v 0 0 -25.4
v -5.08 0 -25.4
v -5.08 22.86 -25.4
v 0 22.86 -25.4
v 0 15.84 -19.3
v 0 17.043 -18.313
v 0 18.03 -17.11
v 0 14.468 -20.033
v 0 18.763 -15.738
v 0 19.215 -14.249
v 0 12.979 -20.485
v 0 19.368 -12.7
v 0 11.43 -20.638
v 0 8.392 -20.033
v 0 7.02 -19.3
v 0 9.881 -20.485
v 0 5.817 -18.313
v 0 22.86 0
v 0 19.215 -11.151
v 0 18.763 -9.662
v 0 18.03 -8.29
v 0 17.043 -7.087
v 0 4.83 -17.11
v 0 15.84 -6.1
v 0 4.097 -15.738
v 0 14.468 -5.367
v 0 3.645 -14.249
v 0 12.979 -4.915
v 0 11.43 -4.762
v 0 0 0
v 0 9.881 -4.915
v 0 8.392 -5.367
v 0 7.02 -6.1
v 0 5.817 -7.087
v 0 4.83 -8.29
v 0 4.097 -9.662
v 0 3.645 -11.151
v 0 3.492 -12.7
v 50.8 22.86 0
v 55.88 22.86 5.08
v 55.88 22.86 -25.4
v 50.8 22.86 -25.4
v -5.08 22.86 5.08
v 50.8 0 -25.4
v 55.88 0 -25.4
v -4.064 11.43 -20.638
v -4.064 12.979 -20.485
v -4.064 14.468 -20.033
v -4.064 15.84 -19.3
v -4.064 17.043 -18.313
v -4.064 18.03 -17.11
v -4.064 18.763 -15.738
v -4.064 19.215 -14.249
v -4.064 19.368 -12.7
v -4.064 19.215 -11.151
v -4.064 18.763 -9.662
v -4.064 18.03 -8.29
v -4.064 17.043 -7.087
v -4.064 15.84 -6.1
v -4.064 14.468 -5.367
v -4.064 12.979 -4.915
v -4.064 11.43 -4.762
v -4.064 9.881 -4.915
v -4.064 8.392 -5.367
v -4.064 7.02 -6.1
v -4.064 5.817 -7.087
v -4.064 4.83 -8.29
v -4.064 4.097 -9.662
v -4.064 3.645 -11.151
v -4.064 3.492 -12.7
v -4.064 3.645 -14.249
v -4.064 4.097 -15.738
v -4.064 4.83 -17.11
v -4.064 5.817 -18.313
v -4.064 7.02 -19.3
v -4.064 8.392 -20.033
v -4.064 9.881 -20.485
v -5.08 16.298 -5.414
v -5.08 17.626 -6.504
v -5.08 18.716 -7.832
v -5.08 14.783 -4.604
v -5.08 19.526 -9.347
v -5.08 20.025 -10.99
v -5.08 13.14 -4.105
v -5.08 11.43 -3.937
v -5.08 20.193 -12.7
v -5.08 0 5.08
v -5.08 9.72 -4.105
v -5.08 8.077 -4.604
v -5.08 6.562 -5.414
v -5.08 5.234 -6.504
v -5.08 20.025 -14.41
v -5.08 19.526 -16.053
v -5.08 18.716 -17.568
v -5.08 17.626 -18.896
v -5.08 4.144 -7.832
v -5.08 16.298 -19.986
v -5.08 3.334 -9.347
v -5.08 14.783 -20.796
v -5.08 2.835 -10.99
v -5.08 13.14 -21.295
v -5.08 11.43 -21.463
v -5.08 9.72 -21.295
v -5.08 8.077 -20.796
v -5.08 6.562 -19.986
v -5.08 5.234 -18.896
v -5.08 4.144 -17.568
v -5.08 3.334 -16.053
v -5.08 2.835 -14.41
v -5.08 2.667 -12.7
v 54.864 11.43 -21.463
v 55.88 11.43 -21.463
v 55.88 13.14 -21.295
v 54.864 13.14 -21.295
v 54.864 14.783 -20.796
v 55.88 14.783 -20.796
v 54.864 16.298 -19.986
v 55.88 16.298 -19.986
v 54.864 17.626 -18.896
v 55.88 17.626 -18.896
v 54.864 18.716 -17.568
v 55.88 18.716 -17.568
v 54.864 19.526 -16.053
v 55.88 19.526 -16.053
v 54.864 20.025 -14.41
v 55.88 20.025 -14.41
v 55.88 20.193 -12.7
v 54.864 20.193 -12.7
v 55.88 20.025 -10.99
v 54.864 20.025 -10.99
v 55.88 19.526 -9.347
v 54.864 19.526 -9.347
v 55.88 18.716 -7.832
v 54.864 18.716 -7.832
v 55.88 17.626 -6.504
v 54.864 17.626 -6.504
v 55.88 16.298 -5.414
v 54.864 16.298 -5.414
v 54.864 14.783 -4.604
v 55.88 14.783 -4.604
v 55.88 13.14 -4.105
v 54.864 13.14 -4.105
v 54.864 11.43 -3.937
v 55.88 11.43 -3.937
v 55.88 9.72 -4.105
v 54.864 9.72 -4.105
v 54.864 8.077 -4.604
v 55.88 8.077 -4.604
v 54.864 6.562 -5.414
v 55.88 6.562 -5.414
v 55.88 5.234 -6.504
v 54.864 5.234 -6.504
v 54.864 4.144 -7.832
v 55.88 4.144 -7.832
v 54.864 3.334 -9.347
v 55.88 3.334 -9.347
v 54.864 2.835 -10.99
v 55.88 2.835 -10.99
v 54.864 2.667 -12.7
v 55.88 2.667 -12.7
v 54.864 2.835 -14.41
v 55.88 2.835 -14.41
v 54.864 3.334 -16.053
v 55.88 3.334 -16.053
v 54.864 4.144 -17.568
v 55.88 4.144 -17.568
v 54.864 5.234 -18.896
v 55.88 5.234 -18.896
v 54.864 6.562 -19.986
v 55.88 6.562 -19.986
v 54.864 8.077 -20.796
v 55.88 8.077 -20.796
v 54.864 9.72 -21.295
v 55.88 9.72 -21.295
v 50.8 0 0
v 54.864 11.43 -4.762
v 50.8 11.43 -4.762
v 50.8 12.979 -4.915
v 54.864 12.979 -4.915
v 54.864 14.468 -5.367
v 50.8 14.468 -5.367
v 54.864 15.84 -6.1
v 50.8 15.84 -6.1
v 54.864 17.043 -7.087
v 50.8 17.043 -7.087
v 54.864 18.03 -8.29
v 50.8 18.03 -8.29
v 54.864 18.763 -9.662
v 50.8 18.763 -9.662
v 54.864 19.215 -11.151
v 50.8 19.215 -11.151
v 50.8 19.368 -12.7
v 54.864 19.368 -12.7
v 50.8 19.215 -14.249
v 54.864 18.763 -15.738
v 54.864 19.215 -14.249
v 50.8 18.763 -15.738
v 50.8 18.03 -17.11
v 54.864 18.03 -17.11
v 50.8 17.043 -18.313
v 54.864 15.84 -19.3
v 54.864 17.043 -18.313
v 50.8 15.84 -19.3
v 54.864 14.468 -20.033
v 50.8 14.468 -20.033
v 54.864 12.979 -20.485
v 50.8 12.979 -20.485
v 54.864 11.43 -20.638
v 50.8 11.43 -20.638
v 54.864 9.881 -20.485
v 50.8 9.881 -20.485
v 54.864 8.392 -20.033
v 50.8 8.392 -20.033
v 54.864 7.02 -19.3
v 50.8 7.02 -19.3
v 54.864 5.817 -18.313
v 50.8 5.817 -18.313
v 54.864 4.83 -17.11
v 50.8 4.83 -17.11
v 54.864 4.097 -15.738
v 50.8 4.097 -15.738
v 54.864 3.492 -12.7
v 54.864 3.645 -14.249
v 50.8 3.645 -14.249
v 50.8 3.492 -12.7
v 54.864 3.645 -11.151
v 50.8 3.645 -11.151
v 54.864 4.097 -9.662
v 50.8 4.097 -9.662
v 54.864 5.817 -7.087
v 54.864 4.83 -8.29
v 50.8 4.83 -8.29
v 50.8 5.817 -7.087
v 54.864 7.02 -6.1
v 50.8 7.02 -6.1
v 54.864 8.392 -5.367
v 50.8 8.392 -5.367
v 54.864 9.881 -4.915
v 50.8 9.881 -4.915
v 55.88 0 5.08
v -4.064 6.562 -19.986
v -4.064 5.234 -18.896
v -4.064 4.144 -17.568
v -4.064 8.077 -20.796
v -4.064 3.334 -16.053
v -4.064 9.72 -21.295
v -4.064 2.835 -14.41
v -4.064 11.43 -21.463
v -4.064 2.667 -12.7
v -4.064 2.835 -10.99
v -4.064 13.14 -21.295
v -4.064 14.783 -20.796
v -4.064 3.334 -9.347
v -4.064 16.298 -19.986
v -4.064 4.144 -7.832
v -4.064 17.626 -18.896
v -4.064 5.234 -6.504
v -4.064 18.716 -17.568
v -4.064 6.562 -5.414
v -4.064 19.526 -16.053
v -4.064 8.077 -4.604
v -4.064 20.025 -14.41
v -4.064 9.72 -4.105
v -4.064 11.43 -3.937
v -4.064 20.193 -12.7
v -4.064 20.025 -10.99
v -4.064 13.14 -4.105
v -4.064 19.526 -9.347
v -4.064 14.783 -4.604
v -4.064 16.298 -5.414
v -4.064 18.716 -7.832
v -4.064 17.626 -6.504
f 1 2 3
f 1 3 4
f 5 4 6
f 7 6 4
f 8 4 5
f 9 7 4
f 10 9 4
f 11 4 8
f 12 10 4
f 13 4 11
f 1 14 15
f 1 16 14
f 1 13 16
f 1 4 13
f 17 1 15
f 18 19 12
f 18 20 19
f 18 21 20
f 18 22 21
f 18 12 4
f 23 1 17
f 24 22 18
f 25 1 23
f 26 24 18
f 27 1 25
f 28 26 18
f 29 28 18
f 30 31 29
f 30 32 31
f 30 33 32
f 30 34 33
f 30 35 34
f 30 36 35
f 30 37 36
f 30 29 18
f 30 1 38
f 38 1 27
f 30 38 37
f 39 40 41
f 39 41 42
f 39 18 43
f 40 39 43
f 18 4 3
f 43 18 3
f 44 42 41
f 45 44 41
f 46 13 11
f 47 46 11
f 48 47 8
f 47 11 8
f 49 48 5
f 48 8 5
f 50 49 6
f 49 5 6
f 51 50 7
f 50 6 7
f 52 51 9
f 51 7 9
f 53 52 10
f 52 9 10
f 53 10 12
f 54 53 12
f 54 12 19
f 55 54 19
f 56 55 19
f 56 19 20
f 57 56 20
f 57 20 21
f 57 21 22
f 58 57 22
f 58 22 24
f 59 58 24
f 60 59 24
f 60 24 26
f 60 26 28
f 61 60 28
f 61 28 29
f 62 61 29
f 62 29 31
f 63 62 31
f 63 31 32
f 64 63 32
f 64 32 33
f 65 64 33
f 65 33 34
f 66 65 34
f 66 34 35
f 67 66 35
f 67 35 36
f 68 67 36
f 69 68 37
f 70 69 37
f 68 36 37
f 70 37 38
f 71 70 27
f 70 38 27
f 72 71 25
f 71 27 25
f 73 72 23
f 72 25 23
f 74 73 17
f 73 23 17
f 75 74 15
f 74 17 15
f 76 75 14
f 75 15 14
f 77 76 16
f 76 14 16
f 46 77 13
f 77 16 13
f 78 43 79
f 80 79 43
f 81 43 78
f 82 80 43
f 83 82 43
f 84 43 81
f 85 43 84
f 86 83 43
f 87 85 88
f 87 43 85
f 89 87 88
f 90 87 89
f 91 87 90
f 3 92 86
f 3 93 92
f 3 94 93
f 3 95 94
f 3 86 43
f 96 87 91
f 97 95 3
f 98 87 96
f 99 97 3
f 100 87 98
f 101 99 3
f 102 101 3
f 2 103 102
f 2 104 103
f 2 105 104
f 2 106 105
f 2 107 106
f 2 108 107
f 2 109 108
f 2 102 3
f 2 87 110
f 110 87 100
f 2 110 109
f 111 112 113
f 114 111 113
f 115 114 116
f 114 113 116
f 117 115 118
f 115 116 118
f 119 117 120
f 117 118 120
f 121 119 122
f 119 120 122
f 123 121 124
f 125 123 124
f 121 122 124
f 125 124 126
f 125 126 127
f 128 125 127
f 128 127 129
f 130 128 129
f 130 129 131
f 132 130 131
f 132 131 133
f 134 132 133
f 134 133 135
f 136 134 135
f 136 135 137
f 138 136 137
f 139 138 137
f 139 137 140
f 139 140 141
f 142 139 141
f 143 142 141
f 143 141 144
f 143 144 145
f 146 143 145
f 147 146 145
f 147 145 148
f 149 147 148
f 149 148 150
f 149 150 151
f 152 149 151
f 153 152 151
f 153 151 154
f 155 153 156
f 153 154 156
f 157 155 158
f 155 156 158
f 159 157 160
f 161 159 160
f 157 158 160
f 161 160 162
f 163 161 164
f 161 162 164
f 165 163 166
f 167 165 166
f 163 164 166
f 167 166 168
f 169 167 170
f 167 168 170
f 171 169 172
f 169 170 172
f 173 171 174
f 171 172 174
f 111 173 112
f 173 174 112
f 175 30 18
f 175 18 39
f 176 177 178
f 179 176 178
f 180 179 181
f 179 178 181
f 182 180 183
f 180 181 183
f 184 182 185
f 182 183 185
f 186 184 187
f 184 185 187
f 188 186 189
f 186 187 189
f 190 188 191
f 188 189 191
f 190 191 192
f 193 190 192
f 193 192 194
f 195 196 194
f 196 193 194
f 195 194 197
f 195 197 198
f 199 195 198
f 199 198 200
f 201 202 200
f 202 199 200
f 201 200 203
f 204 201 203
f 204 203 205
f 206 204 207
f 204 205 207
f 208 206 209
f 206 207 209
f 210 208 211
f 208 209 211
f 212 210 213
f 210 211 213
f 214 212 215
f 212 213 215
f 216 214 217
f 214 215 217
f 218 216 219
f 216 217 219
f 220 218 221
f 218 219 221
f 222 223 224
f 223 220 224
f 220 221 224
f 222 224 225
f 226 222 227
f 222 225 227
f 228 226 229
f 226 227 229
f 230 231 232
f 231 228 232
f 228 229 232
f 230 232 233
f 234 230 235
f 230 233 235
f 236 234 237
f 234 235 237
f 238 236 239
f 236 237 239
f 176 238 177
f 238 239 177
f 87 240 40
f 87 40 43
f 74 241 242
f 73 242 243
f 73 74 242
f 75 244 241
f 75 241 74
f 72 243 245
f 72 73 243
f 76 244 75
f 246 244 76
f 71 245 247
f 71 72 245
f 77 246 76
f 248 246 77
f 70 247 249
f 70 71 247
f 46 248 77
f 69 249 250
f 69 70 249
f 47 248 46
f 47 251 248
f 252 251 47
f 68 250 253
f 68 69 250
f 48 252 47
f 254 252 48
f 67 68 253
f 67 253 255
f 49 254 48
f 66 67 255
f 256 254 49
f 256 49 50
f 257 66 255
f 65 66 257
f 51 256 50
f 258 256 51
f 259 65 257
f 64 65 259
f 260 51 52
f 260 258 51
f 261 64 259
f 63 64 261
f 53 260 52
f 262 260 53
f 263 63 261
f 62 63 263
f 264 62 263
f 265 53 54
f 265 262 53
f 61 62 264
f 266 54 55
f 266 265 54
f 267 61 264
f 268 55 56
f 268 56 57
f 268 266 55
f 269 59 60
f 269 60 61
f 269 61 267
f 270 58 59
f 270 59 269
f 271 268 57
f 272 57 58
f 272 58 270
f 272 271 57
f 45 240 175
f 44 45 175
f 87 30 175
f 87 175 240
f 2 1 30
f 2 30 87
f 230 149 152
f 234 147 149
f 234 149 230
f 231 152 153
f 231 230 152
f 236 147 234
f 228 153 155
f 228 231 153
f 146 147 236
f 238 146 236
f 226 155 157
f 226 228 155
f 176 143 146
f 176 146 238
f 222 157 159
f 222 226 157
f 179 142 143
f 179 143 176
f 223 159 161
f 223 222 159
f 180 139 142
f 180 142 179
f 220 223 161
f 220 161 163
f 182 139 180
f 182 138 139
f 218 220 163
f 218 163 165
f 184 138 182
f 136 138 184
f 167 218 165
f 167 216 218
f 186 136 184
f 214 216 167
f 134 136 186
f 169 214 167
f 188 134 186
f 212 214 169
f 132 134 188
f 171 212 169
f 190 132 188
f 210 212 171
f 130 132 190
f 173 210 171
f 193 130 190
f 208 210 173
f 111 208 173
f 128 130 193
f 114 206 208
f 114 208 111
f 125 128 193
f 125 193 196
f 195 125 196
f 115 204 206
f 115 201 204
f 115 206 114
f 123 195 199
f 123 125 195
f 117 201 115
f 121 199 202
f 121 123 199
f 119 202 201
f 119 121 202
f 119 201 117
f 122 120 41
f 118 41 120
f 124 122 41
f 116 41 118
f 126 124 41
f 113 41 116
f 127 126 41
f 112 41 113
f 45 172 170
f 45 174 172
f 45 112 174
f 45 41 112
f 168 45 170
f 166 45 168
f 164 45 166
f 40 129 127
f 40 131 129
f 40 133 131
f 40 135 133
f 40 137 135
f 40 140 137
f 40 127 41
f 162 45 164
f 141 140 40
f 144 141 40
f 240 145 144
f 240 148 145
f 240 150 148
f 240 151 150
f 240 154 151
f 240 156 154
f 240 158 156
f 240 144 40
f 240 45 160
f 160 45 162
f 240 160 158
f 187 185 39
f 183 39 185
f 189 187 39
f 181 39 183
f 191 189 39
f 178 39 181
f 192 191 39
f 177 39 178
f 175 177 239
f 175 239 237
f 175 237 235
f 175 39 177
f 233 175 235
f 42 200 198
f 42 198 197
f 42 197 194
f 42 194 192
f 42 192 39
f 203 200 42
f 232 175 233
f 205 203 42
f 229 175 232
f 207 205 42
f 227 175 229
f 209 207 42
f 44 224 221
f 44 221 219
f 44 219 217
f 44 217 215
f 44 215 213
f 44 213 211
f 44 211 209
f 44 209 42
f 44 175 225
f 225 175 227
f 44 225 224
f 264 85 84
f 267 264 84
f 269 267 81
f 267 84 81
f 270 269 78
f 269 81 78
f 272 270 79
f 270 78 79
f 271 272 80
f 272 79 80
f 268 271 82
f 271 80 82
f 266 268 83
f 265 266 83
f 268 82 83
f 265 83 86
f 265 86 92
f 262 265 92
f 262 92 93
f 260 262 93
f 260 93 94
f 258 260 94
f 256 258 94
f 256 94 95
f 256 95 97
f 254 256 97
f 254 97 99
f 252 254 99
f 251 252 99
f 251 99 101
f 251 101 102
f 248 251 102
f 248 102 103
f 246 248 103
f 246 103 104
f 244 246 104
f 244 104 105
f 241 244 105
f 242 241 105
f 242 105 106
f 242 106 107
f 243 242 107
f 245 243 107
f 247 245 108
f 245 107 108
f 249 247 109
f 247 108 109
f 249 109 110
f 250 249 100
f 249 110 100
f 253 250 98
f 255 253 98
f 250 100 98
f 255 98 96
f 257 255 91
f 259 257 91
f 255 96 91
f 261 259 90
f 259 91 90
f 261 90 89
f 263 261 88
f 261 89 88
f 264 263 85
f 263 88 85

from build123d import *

# Parameters (mm, degrees)
EXTRUDE_THIN1_DEPTH                            = 22.86
CBORE_FOR_6_SOCKET_HEAD_CAP_SCREW1_D           = 15.875
CBORE_FOR_6_SOCKET_HEAD_CAP_SCREW1_DEPTH       = 5.08
CBORE_FOR_6_SOCKET_HEAD_CAP_SCREW1_CBORE_D     = 17.526
CBORE_FOR_6_SOCKET_HEAD_CAP_SCREW1_CBORE_DEPTH = 1.016
CBORE_FOR_6_SOCKET_HEAD_CAP_SCREW2_D           = 15.875
CBORE_FOR_6_SOCKET_HEAD_CAP_SCREW2_CBORE_D     = 17.526
CBORE_FOR_6_SOCKET_HEAD_CAP_SCREW2_CBORE_DEPTH = 1.016


with BuildPart() as part:
    # Sketch1 → Extrude-Thin1 (new body)
    with BuildSketch(Plane(origin=(0, 0, 0), x_dir=(1, 0, 0), z_dir=(0, 1, 0))):
        Polygon((0, 25.4), (0, 0), (50.8, 0), (50.8, 25.4), (55.88, 25.4), (55.88, -5.08), (-5.08, -5.08), (-5.08, 25.4), align=None)
    extrude(amount=EXTRUDE_THIN1_DEPTH)

    # CBORE for #6 Socket Head Cap Screw1
    with Locations(Plane(origin=(55.88, 0, 0), x_dir=(0, 0, -1), z_dir=(1, 0, 0))):
        with Locations((12.7, 11.43)):
            CounterBoreHole(CBORE_FOR_6_SOCKET_HEAD_CAP_SCREW1_D / 2, CBORE_FOR_6_SOCKET_HEAD_CAP_SCREW1_CBORE_D / 2, CBORE_FOR_6_SOCKET_HEAD_CAP_SCREW1_CBORE_DEPTH, depth=CBORE_FOR_6_SOCKET_HEAD_CAP_SCREW1_DEPTH)

    # CBORE for #6 Socket Head Cap Screw2 (through all)
    with Locations(Plane.ZY.offset(5.08)):
        with Locations((-12.7, 11.43)):
            CounterBoreHole(CBORE_FOR_6_SOCKET_HEAD_CAP_SCREW2_D / 2, CBORE_FOR_6_SOCKET_HEAD_CAP_SCREW2_CBORE_D / 2, CBORE_FOR_6_SOCKET_HEAD_CAP_SCREW2_CBORE_DEPTH)


solid = part.part
